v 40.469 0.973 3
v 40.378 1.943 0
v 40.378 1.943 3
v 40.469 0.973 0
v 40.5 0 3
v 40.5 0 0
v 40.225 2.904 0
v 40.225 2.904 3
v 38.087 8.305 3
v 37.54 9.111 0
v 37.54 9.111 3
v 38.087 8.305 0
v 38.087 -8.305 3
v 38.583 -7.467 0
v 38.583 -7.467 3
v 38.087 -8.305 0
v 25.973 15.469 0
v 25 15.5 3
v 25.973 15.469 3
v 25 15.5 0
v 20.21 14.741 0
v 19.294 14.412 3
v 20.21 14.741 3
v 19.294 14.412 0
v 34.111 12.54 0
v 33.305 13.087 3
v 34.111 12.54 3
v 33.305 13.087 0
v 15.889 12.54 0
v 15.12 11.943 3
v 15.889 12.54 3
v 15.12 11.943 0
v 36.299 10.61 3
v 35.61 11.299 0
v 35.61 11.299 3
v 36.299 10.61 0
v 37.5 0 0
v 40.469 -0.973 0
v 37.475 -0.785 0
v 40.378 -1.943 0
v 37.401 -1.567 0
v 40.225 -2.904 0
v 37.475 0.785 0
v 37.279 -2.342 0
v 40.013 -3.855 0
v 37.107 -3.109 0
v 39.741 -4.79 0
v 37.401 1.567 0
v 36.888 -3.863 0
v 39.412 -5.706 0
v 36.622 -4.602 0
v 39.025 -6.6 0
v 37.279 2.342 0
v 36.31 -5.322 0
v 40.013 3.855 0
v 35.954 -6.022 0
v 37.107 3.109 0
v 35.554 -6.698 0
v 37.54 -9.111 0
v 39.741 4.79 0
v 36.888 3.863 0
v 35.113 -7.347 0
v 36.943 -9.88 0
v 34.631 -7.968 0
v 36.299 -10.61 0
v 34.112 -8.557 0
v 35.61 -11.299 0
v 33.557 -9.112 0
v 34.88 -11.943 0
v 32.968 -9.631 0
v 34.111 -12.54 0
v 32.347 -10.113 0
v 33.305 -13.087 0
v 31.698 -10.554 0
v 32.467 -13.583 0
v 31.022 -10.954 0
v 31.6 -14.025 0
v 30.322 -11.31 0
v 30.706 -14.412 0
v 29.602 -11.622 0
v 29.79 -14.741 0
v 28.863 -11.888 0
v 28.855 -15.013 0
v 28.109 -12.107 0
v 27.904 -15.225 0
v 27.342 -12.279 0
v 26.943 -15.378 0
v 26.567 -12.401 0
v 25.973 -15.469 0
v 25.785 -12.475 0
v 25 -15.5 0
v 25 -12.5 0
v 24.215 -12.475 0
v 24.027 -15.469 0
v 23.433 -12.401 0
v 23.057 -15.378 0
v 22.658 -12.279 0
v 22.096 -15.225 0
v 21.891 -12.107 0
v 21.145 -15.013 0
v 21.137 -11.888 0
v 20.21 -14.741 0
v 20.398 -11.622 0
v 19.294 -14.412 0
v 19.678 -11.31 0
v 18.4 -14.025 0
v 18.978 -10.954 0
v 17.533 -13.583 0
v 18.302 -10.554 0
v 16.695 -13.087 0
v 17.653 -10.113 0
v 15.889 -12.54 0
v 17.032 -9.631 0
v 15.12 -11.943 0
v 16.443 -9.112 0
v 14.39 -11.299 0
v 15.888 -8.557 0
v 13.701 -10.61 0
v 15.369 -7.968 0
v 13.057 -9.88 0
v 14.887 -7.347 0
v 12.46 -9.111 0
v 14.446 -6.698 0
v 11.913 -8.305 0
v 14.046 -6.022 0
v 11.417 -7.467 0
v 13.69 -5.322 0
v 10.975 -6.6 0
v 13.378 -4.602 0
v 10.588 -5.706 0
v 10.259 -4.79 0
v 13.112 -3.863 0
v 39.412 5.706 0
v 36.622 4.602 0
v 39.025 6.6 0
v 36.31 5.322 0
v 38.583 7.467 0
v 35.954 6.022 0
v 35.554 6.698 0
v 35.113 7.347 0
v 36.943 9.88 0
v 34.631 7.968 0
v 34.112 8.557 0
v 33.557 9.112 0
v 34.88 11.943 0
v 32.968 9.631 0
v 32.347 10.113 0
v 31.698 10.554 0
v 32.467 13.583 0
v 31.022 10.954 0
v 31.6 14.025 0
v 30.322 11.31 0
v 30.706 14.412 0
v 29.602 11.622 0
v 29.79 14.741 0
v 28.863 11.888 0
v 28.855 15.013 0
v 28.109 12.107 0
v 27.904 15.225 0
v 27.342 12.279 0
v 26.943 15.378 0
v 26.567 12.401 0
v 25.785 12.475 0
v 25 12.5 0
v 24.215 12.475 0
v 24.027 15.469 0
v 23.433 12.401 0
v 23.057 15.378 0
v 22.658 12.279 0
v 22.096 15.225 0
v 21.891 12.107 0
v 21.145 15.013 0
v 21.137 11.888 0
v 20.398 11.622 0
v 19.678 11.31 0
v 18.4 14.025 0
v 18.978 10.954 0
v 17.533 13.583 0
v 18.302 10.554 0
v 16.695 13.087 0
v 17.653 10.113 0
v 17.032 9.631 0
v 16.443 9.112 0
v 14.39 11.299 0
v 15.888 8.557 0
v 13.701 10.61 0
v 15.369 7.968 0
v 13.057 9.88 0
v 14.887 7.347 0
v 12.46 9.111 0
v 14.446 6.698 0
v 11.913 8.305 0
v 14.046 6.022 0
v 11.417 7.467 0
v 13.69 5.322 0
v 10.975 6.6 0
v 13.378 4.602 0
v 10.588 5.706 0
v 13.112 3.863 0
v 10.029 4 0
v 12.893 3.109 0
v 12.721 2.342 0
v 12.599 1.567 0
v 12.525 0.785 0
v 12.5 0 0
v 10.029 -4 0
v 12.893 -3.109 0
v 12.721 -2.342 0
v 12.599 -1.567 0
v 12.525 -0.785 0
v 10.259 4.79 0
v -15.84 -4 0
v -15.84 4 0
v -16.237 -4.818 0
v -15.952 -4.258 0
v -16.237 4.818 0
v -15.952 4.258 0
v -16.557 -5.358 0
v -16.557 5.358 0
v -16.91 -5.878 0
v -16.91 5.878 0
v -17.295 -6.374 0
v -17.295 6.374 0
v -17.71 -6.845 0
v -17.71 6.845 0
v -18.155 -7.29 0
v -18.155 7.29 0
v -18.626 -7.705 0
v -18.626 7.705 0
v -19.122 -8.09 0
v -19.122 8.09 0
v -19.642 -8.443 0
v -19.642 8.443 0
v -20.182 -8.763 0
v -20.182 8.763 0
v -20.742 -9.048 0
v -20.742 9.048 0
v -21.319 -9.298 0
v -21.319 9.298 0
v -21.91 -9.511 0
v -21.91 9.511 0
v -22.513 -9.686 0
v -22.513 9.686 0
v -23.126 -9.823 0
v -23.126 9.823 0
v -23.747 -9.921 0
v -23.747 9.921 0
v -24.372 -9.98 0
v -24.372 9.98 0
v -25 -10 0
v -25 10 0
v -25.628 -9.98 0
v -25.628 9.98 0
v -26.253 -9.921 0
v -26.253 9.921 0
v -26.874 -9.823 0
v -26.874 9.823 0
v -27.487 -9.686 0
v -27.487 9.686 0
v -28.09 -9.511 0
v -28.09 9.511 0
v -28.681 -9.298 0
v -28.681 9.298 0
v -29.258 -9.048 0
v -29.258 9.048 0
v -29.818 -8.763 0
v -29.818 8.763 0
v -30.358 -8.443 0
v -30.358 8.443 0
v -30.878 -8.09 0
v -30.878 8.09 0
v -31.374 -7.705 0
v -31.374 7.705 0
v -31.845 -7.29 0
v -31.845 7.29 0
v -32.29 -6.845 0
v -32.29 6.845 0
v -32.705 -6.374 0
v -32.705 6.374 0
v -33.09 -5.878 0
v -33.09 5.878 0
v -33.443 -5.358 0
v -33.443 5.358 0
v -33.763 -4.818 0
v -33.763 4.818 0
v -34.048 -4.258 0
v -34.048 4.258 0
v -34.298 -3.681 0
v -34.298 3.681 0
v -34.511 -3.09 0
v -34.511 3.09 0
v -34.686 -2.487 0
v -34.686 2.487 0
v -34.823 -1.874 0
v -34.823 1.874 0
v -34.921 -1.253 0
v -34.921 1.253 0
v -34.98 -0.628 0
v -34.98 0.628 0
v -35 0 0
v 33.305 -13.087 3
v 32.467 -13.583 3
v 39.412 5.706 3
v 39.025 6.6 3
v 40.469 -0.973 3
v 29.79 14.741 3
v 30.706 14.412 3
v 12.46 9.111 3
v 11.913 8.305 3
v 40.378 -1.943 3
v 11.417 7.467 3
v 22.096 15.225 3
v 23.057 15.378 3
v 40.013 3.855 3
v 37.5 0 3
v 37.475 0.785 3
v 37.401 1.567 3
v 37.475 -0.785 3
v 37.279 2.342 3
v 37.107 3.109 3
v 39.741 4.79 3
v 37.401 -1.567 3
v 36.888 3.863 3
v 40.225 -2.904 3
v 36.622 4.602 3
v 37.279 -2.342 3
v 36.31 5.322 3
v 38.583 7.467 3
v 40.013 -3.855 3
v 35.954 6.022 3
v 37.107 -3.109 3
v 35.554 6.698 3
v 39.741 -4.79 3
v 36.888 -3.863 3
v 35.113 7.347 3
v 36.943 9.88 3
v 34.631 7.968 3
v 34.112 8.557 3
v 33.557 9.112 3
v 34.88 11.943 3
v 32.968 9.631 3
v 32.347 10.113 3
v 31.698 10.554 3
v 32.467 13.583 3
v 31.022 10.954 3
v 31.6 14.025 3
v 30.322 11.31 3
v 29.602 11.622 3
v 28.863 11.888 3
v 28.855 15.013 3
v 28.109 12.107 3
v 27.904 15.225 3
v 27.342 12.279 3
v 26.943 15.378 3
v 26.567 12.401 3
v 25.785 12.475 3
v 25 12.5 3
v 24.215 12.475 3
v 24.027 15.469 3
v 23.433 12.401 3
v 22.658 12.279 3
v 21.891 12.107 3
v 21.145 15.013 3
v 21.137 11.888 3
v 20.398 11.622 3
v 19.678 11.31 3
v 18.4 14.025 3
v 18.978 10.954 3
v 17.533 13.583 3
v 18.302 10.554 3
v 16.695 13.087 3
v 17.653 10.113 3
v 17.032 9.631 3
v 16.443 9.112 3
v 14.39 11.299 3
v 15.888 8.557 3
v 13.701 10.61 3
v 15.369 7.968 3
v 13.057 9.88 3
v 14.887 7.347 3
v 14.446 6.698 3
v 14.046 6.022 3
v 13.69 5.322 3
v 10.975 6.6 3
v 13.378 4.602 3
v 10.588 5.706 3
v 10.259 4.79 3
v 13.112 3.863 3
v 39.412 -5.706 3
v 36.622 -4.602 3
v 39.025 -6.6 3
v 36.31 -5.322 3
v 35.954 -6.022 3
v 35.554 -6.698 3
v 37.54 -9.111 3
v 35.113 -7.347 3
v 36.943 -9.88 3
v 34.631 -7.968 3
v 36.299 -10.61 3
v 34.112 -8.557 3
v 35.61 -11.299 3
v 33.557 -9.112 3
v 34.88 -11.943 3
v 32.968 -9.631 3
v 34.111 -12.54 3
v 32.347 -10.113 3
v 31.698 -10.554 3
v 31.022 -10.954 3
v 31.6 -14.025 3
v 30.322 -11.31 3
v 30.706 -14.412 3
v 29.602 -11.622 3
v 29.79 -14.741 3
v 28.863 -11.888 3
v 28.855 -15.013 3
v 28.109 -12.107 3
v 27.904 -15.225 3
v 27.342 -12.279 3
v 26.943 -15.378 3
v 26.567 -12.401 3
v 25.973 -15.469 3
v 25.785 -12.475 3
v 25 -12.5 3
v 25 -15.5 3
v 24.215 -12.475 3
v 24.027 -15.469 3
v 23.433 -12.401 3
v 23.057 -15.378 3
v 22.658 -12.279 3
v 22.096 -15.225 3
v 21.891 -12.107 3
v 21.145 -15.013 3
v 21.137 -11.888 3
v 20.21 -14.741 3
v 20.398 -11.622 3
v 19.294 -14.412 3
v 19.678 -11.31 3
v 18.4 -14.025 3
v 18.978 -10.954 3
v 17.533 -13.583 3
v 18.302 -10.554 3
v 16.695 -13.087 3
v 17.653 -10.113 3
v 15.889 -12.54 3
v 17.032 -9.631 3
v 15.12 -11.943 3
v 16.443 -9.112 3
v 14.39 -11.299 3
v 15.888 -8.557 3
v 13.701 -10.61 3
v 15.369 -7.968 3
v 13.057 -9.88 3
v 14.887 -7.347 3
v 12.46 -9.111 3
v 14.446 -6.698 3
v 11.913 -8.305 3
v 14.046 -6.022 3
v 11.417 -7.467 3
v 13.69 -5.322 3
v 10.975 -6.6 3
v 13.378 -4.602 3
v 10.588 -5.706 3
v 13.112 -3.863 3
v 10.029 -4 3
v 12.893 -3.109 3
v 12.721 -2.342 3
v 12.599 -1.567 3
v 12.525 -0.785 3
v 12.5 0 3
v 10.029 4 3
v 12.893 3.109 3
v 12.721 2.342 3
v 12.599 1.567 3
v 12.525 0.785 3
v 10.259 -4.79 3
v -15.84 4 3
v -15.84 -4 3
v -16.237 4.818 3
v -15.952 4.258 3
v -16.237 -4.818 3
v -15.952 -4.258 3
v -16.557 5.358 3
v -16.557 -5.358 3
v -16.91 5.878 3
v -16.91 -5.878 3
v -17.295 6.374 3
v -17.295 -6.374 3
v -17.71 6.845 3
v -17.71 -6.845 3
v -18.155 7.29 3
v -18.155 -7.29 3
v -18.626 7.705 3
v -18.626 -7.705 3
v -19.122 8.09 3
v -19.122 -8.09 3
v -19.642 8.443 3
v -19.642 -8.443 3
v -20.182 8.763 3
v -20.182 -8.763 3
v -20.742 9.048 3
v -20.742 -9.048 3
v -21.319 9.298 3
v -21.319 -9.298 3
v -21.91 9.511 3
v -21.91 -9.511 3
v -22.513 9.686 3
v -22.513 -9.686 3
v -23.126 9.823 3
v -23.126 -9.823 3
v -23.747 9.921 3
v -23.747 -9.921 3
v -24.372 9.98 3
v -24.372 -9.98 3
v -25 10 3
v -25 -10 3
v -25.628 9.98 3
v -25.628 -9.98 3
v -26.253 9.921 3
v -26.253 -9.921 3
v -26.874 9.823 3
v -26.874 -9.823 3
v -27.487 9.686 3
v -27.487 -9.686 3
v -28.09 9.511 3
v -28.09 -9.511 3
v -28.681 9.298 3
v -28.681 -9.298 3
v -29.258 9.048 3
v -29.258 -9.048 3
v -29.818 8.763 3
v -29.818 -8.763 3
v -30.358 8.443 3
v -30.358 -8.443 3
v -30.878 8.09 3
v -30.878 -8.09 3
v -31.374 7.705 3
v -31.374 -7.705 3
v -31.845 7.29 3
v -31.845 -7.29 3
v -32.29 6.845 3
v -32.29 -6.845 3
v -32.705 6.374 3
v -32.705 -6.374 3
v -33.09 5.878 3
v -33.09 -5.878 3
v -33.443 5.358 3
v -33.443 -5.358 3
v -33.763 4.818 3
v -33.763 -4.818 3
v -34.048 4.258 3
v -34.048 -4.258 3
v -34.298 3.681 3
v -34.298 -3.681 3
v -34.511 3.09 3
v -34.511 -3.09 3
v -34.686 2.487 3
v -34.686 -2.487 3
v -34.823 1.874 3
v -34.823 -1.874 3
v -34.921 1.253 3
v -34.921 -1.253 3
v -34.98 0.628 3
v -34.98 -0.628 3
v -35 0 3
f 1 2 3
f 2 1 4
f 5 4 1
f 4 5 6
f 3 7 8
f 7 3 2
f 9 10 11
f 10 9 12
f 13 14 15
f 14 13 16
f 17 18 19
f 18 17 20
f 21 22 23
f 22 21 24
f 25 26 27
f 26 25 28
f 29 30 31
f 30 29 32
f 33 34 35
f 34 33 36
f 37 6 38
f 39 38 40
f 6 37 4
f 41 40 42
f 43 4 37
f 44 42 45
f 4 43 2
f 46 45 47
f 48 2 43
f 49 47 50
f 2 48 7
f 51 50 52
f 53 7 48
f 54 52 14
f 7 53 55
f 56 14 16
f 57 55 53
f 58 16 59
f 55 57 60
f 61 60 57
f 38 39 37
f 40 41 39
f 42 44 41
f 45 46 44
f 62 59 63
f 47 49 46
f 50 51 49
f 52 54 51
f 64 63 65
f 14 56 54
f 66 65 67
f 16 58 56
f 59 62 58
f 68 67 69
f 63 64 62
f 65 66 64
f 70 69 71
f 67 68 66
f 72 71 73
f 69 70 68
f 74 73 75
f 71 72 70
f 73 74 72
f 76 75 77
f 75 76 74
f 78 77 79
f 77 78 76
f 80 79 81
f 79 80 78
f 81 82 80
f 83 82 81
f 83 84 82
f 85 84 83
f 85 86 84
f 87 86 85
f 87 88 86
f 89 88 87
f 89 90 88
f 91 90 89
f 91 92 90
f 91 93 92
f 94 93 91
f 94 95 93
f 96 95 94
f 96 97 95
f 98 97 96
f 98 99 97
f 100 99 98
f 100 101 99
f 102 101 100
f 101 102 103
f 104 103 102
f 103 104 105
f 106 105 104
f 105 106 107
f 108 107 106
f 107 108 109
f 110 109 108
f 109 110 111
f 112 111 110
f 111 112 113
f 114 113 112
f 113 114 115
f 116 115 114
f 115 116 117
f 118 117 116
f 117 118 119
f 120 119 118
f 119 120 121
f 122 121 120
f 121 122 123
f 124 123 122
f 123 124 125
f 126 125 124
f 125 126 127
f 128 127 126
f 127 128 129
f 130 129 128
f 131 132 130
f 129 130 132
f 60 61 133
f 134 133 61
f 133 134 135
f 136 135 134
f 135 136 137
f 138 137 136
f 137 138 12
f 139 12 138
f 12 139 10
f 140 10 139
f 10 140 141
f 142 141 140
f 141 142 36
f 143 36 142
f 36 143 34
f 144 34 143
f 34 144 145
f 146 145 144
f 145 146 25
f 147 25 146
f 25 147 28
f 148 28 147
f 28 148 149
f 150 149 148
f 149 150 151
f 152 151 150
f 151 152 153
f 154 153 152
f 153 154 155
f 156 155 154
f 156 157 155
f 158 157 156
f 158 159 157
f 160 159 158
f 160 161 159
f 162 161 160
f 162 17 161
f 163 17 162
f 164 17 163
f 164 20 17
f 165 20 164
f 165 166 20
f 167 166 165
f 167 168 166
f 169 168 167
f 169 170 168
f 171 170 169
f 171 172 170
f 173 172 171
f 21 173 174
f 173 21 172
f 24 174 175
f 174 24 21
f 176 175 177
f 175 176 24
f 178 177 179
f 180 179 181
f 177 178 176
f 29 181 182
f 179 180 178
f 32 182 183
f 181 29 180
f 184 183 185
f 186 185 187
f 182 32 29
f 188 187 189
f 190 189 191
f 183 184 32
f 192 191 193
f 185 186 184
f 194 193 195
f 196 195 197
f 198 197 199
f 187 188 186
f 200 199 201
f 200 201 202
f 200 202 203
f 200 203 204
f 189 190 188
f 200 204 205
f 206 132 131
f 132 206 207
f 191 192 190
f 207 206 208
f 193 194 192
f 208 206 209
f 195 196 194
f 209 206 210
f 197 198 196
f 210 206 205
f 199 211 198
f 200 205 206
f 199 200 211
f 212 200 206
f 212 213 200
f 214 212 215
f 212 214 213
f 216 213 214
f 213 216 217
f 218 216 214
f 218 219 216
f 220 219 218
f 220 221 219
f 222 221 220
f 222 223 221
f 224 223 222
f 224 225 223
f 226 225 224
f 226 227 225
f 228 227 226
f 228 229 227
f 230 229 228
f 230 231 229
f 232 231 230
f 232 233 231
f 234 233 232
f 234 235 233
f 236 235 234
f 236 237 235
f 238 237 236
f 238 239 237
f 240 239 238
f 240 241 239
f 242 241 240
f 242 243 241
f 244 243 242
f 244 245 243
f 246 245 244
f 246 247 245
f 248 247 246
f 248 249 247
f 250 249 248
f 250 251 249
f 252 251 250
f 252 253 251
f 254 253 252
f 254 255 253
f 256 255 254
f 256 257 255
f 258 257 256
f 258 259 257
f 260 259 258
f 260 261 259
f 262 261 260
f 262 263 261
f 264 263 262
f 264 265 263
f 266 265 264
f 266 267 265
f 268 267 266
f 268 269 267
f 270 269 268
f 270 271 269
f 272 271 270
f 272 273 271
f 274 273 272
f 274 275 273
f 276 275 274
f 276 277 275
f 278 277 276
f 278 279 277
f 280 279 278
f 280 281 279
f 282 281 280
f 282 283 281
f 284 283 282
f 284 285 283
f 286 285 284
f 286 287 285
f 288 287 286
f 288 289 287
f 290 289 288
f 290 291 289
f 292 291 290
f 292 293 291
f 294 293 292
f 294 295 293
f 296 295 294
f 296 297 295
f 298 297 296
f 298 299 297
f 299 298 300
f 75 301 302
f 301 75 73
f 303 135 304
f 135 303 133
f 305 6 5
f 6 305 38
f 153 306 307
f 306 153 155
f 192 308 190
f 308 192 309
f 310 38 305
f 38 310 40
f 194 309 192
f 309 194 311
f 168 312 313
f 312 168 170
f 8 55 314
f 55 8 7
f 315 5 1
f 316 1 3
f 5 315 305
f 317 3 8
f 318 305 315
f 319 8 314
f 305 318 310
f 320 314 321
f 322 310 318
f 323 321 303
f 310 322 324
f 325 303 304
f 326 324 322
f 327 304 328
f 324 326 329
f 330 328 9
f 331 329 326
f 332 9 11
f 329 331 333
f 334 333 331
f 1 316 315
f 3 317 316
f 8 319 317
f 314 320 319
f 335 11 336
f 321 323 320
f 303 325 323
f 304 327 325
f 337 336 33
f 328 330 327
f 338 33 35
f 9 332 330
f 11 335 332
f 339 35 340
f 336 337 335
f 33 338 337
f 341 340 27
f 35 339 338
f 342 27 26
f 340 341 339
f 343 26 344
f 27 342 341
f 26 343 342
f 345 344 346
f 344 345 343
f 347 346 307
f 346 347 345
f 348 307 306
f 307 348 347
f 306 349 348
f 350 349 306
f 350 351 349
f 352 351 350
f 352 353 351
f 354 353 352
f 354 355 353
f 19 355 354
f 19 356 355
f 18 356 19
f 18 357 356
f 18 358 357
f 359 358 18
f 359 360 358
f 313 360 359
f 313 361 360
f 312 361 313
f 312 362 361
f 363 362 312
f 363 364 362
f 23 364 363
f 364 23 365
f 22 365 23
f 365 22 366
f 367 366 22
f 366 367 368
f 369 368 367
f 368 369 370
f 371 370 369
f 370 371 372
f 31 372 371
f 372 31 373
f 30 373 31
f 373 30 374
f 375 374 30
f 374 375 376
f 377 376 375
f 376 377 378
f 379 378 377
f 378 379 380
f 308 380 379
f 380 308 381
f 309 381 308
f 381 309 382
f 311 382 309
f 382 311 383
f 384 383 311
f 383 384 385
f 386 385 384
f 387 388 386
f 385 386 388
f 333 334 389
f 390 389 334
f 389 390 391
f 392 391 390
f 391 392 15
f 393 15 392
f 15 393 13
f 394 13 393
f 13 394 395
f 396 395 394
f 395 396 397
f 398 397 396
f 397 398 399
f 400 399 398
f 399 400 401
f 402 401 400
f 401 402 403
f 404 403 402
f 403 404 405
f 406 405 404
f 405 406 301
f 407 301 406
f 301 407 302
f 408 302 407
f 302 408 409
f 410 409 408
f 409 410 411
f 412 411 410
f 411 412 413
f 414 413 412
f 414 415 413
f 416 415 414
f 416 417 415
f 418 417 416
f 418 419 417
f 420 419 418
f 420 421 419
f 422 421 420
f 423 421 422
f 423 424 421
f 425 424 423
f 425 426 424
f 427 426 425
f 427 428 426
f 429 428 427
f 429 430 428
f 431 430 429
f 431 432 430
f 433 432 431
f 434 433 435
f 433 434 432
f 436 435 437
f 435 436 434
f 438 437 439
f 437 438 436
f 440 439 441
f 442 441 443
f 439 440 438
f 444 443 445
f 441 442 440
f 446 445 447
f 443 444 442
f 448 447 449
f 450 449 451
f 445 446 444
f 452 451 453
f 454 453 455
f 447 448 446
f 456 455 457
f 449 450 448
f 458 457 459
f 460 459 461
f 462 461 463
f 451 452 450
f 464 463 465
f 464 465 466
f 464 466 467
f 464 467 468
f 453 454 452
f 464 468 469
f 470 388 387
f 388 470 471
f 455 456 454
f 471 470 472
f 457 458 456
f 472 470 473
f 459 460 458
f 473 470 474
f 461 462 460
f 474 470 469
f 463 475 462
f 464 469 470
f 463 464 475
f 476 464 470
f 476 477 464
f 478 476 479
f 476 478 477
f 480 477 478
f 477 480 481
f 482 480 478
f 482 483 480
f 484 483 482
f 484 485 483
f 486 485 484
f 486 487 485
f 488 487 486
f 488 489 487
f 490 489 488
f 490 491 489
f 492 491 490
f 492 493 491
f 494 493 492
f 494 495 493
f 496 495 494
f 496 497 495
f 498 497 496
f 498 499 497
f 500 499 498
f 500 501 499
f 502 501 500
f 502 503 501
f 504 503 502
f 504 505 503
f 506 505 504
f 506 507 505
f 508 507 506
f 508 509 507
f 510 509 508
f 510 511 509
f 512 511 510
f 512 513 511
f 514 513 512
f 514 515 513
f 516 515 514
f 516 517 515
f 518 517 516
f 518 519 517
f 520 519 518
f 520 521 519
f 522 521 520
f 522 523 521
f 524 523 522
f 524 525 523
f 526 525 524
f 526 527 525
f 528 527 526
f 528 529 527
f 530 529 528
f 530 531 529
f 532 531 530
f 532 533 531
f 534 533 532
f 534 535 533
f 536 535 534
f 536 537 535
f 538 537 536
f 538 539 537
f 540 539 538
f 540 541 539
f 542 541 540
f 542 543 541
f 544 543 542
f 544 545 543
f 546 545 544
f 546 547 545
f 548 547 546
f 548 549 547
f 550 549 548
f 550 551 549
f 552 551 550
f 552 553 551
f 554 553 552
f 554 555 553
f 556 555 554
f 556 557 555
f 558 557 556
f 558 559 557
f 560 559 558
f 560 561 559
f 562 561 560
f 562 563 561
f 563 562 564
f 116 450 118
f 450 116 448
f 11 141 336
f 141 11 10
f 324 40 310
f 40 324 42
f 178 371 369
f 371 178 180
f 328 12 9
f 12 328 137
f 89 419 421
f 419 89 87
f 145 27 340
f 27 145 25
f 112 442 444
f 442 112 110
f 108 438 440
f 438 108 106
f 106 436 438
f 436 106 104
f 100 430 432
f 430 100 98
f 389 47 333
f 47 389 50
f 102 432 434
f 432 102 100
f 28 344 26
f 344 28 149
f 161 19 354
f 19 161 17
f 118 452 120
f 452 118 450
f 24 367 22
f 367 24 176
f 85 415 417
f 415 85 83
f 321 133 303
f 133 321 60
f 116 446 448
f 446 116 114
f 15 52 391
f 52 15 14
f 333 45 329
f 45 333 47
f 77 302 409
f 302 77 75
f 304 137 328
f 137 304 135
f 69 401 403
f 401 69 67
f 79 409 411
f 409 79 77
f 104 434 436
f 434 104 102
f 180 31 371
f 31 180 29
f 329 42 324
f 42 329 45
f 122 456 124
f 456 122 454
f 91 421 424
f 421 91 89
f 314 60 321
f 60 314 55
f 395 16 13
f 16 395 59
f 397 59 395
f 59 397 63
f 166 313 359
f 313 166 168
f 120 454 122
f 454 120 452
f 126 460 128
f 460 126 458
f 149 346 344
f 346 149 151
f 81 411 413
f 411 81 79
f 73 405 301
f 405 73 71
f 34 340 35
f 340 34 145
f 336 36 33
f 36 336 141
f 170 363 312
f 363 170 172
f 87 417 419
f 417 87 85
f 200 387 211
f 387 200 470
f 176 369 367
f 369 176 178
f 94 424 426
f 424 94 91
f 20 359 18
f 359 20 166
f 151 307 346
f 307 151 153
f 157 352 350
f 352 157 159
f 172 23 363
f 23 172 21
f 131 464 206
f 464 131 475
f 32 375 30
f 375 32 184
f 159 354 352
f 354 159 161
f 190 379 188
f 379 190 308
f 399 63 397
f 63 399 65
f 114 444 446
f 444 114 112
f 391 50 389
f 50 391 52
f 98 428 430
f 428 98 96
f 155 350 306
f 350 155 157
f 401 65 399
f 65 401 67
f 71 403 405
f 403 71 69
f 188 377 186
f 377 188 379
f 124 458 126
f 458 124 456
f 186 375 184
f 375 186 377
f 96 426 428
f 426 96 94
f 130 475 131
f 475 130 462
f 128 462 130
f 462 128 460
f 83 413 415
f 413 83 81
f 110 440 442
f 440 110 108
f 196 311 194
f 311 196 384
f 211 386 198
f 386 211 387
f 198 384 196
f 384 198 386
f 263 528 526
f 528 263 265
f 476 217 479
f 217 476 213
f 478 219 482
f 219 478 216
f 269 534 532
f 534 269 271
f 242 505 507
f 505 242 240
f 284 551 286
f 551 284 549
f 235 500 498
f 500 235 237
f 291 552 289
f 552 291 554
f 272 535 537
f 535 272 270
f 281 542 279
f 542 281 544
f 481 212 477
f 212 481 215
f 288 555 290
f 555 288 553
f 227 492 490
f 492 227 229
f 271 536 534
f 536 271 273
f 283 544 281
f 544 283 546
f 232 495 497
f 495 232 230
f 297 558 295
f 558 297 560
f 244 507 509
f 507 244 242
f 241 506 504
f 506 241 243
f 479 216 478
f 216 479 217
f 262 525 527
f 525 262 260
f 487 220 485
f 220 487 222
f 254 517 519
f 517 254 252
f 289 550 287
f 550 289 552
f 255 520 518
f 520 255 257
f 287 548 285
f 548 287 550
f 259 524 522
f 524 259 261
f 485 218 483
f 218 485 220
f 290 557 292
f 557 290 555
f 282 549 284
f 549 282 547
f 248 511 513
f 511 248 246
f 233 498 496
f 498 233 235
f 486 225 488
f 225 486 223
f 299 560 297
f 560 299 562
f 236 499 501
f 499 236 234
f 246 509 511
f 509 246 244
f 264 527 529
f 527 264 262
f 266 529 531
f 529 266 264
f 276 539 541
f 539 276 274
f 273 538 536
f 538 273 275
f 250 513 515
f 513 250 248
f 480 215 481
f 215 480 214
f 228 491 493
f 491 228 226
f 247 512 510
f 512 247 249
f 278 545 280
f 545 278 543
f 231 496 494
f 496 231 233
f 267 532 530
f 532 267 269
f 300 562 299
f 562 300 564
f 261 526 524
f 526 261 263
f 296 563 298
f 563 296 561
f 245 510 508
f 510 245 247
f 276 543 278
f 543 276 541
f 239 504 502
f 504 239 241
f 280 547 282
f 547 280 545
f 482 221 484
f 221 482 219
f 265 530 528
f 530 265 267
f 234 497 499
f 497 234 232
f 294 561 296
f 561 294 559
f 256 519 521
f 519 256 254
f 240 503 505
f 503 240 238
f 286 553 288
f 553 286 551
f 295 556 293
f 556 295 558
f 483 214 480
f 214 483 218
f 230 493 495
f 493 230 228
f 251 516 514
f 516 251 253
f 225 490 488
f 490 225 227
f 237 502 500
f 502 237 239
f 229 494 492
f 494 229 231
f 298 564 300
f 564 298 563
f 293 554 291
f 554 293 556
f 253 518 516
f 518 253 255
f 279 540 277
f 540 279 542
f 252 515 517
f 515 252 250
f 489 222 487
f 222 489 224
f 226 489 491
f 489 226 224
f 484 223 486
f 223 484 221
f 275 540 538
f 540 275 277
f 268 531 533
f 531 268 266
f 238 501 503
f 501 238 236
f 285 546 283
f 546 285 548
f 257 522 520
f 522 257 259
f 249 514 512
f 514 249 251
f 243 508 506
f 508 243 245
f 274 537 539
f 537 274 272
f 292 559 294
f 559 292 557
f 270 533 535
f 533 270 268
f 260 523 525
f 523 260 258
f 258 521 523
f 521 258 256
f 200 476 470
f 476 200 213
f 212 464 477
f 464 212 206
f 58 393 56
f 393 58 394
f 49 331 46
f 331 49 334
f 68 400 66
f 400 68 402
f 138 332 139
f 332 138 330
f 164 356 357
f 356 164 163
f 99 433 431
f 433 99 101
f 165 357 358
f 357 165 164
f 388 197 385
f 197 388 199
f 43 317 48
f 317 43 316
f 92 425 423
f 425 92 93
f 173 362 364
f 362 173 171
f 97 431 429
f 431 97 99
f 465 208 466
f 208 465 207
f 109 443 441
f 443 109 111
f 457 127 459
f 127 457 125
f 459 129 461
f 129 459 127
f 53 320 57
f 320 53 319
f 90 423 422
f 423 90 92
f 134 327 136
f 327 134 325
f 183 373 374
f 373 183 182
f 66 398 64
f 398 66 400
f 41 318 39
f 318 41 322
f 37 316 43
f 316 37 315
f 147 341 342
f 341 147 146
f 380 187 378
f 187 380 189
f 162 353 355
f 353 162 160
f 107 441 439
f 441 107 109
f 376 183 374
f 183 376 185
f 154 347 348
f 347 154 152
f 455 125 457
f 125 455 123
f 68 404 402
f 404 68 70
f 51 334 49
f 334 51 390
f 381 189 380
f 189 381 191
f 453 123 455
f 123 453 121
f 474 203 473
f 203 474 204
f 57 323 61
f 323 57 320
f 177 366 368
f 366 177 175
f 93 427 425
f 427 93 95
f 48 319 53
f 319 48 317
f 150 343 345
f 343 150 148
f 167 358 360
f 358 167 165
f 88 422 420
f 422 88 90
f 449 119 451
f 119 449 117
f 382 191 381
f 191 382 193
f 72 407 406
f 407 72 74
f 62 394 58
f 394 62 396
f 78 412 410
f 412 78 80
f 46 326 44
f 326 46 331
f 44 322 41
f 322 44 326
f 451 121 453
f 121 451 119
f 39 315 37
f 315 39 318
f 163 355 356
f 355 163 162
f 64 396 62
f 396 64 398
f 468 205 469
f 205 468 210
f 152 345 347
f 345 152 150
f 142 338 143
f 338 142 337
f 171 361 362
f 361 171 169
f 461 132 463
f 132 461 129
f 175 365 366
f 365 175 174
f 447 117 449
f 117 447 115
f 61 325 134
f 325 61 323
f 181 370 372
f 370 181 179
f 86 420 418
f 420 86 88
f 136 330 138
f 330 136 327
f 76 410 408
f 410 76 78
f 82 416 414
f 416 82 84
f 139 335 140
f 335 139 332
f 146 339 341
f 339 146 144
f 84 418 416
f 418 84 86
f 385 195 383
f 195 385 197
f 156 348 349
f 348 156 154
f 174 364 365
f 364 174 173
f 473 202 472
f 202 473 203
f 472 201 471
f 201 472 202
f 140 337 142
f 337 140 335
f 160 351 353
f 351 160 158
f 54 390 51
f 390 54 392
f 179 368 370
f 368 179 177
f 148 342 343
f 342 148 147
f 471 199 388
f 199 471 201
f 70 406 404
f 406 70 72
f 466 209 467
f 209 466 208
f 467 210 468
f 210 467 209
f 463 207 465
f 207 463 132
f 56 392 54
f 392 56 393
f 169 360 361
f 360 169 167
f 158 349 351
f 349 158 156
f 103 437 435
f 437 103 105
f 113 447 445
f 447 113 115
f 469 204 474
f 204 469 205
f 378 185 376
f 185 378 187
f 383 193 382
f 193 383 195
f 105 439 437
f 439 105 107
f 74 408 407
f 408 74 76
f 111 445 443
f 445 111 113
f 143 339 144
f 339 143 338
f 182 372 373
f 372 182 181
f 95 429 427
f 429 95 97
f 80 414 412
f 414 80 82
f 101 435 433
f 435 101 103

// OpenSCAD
LENGTH = 50;
THICKNESS = 3;

BAR_WIDTH = 8;
TIP_DIA = 20;
AUGER_DIA = 25;

$fn = 100;

module agitator() {
  difference() {
    union() {
      translate([LENGTH/2, 0, 0])
      cylinder(d = AUGER_DIA + 2 * THICKNESS, h = THICKNESS);
      translate([-LENGTH/2, 0, 0])
      cylinder(d = TIP_DIA, h = THICKNESS);
      translate([-LENGTH/2, -BAR_WIDTH/2, 0])
      cube(size = [LENGTH, BAR_WIDTH, THICKNESS]);
    }
    translate([LENGTH/2, 0, 0])
    cylinder(d = AUGER_DIA, h = THICKNESS);
  }
}

agitator();
